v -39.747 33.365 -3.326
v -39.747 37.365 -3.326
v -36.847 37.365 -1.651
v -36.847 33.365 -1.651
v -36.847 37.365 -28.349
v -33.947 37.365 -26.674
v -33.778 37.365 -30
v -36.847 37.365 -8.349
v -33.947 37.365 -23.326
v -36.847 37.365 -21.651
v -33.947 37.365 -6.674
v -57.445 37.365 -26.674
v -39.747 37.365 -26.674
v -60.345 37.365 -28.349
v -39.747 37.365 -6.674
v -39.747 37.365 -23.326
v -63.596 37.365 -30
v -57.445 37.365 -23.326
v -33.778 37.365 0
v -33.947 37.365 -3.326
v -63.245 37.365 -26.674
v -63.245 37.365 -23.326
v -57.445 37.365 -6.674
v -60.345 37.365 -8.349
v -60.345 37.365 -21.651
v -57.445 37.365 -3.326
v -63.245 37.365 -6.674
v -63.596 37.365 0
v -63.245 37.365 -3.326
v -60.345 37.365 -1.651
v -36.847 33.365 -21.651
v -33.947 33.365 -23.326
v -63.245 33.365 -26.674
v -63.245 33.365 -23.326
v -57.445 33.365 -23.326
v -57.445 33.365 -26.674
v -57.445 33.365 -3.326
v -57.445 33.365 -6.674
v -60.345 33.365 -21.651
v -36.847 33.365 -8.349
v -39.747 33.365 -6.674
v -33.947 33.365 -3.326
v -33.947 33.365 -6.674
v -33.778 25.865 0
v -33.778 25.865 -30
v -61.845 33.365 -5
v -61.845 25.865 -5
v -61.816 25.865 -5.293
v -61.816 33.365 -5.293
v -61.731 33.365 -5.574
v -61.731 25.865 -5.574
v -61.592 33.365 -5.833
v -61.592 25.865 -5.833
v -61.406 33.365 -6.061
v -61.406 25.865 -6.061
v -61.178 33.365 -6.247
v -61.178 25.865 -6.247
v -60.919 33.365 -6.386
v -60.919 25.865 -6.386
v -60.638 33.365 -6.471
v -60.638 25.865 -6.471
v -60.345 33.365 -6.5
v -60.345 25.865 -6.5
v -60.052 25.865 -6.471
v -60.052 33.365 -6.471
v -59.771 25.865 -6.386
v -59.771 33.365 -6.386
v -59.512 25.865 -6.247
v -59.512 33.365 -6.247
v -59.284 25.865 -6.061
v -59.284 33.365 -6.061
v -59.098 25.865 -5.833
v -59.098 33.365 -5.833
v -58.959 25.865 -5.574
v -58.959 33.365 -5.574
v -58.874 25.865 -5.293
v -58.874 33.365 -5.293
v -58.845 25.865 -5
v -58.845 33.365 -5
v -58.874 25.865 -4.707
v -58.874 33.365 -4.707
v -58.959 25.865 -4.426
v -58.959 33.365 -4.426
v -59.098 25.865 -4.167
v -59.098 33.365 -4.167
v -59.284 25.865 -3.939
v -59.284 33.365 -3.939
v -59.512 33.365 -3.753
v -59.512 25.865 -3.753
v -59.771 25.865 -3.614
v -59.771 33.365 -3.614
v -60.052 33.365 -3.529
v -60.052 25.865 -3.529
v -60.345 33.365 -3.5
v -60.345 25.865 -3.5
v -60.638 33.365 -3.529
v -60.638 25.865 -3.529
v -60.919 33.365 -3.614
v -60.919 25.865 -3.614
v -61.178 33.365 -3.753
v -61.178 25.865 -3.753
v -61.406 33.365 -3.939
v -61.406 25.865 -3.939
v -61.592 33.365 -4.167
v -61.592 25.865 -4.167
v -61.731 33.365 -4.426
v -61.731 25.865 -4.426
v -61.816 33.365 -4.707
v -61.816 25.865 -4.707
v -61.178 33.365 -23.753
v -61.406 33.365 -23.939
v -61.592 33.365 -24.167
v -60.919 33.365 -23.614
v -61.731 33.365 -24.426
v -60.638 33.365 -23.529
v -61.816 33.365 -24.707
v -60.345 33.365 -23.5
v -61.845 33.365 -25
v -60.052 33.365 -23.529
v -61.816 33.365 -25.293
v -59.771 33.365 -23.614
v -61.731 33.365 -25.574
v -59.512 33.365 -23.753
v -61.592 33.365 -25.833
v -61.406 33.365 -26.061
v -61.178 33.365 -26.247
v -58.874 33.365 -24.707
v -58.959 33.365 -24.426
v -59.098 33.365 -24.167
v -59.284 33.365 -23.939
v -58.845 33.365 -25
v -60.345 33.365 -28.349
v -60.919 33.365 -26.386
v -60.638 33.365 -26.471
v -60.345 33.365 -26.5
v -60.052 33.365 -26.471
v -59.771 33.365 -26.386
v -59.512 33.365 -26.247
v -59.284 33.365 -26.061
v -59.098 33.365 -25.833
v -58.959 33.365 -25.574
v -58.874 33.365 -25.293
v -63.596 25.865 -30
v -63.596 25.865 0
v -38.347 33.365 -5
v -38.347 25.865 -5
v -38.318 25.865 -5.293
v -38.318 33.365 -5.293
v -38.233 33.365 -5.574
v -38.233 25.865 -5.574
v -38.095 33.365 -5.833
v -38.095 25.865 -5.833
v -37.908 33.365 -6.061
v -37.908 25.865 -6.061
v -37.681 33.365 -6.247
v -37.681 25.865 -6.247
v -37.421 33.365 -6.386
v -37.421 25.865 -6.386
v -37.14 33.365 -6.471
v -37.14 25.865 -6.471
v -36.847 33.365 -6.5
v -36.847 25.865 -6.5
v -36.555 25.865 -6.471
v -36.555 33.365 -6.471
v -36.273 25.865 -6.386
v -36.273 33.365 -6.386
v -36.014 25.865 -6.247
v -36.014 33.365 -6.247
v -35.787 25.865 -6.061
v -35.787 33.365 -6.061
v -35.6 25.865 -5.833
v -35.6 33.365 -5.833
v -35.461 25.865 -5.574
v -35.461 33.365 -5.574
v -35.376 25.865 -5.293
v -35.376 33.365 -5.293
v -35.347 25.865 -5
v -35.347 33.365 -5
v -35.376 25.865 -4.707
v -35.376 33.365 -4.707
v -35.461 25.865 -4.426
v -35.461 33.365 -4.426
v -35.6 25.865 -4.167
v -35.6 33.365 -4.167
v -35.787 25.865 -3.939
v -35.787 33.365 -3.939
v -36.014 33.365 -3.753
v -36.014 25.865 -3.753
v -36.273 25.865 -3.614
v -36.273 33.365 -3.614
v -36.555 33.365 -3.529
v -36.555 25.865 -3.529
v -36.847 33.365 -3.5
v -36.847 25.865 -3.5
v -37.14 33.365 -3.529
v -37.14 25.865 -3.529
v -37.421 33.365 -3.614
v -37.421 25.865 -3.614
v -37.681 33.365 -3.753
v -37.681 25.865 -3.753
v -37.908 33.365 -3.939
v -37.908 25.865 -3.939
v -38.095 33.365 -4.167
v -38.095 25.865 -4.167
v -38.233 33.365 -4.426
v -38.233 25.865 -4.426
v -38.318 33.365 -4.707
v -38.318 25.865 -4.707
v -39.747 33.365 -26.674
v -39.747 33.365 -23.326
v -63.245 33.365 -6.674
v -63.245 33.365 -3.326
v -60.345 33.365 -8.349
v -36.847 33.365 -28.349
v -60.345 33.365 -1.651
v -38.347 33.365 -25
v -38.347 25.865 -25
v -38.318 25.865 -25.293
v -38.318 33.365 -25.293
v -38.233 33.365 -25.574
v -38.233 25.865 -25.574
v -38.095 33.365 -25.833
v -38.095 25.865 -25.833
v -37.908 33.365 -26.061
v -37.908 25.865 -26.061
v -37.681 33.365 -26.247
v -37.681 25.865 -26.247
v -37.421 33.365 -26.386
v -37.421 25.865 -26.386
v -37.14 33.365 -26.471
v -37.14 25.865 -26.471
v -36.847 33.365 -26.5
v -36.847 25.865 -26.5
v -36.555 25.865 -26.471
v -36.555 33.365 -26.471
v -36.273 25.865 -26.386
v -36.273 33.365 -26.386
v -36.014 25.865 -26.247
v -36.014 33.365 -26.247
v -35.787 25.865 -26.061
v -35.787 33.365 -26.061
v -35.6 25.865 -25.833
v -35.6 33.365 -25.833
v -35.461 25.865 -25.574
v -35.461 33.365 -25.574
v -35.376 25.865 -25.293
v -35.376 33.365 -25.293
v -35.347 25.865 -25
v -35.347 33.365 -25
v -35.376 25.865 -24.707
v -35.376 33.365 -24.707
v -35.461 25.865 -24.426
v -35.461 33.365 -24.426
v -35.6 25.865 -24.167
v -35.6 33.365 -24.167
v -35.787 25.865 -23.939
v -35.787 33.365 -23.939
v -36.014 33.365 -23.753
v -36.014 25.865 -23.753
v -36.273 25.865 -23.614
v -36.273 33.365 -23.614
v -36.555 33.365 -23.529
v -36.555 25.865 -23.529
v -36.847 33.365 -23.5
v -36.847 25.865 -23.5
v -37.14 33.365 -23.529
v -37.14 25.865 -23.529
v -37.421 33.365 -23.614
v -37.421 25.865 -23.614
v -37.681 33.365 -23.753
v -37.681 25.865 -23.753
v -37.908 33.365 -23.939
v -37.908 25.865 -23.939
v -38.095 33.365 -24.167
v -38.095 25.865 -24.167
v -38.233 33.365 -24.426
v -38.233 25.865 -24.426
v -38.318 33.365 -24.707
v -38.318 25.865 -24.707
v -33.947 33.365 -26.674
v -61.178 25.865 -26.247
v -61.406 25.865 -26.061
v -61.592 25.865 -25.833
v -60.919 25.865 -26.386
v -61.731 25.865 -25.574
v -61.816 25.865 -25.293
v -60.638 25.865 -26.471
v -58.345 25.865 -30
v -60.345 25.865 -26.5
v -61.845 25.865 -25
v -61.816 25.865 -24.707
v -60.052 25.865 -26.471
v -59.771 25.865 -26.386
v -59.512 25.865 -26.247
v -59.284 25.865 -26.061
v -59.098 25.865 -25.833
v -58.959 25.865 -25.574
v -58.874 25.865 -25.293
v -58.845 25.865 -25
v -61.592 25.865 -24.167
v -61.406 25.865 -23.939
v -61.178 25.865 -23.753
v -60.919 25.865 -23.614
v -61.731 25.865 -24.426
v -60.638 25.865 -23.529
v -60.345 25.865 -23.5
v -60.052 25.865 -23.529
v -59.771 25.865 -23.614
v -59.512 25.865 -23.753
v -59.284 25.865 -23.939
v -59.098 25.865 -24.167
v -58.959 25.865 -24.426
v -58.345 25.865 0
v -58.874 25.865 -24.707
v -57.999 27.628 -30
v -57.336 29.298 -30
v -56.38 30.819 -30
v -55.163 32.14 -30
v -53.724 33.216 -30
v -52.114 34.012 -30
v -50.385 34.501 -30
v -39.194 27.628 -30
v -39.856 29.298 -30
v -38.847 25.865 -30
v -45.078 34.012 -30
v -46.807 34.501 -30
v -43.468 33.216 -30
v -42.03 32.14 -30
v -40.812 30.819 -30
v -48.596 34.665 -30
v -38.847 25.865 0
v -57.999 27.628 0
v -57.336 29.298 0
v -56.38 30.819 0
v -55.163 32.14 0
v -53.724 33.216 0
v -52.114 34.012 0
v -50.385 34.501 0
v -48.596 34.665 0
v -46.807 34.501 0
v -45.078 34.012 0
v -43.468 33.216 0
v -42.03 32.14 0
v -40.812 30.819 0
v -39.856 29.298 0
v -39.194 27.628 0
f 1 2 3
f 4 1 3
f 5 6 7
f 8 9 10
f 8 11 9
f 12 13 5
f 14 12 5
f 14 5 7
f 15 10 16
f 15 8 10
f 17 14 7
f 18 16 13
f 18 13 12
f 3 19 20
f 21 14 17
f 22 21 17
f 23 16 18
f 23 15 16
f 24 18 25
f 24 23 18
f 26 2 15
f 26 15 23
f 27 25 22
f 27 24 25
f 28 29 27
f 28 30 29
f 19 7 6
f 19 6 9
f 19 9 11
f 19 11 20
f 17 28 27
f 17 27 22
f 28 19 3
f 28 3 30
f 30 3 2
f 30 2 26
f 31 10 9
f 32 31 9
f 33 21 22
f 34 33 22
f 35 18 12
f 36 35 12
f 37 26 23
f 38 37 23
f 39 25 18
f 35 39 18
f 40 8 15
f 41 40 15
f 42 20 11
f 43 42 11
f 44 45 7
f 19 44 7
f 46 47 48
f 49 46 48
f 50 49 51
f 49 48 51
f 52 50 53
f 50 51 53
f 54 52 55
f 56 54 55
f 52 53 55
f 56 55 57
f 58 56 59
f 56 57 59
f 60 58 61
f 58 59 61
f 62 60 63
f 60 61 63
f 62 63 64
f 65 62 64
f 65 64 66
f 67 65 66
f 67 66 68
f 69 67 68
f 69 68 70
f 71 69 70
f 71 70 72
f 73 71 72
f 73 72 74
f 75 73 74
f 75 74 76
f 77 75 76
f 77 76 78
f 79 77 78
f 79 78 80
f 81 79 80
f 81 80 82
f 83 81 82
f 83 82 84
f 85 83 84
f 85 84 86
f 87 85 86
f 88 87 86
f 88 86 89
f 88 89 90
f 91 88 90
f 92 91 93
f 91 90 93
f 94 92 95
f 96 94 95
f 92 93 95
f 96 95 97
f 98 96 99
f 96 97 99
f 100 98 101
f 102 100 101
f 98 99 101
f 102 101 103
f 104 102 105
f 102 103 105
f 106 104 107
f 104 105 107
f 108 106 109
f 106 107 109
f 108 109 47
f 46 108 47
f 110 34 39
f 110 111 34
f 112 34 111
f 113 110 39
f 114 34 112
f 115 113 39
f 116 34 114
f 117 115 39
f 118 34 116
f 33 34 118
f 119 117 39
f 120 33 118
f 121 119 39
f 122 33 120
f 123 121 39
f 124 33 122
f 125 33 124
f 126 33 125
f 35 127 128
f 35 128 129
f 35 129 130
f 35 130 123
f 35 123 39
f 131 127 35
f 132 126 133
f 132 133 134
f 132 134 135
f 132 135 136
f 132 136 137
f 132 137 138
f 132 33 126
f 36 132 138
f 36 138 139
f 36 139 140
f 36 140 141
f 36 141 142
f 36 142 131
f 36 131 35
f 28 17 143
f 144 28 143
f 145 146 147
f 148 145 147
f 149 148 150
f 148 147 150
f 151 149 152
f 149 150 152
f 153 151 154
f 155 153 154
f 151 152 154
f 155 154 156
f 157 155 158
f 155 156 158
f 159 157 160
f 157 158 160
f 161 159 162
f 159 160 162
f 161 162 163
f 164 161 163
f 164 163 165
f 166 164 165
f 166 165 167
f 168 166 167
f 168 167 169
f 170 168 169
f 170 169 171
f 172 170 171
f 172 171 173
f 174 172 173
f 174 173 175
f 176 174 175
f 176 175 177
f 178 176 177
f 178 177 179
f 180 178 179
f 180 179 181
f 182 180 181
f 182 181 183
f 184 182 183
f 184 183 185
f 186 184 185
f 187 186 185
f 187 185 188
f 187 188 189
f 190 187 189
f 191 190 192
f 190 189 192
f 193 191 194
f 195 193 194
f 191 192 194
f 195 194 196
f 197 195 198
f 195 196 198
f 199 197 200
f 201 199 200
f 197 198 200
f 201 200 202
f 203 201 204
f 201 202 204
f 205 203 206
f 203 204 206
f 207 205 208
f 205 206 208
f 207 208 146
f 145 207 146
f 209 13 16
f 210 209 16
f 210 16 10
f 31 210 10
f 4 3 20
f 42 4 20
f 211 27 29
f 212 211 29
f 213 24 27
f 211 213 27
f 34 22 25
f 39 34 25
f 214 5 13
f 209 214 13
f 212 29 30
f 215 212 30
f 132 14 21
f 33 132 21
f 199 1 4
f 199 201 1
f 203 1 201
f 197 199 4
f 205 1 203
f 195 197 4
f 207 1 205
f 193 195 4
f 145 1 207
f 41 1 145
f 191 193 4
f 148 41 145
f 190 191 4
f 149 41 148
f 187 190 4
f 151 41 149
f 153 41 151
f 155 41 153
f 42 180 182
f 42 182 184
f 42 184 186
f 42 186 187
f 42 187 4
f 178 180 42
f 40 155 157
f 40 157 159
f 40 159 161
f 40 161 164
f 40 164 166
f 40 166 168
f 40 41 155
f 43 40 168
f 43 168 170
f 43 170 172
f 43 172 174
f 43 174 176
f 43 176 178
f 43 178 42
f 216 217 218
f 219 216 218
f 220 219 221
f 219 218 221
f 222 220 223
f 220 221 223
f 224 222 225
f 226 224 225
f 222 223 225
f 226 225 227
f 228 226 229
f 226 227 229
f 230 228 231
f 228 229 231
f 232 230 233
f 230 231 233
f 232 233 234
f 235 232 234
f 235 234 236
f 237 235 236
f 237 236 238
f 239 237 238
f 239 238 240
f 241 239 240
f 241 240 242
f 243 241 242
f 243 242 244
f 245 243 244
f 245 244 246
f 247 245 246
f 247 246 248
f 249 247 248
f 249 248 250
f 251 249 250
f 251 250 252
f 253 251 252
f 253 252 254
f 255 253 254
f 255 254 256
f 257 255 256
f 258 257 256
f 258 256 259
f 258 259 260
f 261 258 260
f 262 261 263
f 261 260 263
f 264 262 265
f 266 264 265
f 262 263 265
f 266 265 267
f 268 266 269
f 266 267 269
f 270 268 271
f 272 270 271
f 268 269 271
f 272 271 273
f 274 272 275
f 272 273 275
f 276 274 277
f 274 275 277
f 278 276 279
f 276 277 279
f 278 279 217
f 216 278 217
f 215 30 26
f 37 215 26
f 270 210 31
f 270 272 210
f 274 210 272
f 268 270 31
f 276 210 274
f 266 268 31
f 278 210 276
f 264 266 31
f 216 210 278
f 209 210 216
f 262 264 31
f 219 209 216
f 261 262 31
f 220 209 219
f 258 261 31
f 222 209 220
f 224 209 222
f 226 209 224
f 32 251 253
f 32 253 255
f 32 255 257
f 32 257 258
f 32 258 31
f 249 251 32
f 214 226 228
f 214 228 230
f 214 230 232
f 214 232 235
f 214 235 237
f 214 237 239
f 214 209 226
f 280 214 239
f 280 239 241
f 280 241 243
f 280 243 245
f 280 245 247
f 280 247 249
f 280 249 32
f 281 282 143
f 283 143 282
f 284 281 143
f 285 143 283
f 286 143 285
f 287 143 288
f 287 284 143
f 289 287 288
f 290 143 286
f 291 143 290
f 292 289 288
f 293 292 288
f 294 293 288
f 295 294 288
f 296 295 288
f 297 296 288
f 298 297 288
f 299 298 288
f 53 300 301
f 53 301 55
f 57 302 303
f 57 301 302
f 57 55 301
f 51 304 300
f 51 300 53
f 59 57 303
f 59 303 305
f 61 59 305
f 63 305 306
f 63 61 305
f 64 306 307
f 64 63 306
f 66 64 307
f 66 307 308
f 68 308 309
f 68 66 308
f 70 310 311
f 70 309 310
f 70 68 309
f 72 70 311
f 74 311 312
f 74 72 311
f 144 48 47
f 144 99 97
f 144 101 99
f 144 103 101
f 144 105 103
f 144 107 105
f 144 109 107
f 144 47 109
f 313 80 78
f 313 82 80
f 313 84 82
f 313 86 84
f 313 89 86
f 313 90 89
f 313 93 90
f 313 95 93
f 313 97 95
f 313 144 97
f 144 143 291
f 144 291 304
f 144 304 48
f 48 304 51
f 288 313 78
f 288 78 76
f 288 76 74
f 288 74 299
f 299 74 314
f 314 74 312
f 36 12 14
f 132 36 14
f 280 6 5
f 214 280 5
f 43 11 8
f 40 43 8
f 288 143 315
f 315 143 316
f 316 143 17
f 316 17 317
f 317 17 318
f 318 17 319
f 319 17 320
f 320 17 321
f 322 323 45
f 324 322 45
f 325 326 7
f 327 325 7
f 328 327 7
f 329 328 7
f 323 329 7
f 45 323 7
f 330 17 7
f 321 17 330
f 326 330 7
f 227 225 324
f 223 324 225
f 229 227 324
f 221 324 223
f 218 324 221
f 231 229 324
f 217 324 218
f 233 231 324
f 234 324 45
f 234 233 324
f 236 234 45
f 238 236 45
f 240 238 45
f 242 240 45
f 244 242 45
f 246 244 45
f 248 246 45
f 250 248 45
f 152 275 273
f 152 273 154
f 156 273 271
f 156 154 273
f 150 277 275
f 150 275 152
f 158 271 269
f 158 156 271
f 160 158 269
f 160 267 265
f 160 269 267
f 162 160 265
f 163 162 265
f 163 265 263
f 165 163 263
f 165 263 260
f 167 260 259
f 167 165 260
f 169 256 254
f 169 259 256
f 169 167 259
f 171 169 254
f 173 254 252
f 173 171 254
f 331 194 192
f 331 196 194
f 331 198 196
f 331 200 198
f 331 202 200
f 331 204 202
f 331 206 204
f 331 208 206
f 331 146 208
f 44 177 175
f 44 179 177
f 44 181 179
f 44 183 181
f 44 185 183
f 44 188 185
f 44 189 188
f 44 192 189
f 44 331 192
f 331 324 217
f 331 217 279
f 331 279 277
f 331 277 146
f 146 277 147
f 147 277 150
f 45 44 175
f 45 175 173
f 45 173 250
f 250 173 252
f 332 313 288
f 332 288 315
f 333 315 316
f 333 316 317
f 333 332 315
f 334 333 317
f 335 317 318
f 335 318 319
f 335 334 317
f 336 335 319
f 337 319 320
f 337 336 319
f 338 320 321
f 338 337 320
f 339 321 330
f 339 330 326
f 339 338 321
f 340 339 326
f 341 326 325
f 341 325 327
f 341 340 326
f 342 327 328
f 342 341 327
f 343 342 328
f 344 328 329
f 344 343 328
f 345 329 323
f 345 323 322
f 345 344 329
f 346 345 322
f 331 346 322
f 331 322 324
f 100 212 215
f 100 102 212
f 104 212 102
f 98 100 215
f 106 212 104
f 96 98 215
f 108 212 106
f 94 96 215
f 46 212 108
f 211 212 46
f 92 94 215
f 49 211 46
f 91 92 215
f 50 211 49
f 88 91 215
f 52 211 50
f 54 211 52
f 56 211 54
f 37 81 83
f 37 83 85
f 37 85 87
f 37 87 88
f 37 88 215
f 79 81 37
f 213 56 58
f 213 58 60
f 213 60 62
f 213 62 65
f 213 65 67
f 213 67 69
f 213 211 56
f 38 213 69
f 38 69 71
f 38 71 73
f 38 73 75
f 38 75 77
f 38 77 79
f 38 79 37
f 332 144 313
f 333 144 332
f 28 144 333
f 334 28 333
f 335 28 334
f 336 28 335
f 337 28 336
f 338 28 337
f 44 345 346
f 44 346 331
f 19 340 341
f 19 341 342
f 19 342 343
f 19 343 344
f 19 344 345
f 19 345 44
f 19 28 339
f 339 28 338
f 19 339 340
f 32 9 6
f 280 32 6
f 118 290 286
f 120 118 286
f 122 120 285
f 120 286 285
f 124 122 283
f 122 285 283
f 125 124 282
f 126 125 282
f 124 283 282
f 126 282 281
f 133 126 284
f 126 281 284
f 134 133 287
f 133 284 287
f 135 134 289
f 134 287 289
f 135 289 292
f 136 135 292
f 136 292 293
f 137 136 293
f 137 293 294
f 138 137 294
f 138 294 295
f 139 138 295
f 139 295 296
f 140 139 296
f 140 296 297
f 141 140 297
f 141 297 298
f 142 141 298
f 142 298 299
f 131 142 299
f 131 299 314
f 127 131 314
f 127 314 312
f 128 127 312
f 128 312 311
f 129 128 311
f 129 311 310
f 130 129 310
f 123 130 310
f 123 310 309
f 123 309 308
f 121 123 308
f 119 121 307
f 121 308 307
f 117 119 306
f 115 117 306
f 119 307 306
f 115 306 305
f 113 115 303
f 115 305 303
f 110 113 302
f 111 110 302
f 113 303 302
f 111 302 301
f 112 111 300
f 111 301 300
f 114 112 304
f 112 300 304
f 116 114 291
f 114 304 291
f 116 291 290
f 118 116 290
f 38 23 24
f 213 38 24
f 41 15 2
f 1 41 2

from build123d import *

# Parameters (mm, degrees)
AUFSATZ_LINEAR_AUSTRAGEN1_DEPTH = 30
F_3_0_3_DURCHMESSER_BOHRUNG1_D  = 3
SCHNITT_LINEAR_AUSTRAGEN1_DEPTH = 4


with BuildPart() as part:
    # Skizze1 → Aufsatz-Linear austragen1 (new body)
    with BuildSketch(Plane.XY):
        with BuildLine():
            Line((-63.596153483, 25.865230167), (-58.344999569, 25.865230167))
            ThreePointArc((-58.344999569, 25.865230167), (-48.596153483, 34.665230167), (-38.847307398, 25.865230167))
            Line((-38.847307398, 25.865230167), (-34.847307398, 25.865230167))
            Line((-34.847307398, 25.865230167), (-34.176711032, 25.865230167))
            Line((-34.176711032, 25.865230167), (-33.778455993, 25.865230167))
            Line((-33.778455993, 25.865230167), (-33.778455993, 37.365230166))
            Line((-33.778455993, 37.365230166), (-34.847307398, 37.365230166))
            Line((-34.847307398, 37.365230166), (-48.596153483, 37.365230166))
            Line((-48.596153483, 37.365230166), (-63.596153483, 37.365230166))
            Line((-63.596153483, 37.365230166), (-63.596153483, 25.865230167))
        make_face()
    extrude(amount=-AUFSATZ_LINEAR_AUSTRAGEN1_DEPTH)

    # Ø3.0 (3) Durchmesser Bohrung1 (through all)
    with Locations(Plane(origin=(0, 37.365230166, 0), x_dir=(1, 0, 0), z_dir=(0, 1, 0))):
        with Locations((-36.847307398, 5), (-60.344999569, 5), (-60.344999569, 25), (-36.847307398, 25)):
            Hole(F_3_0_3_DURCHMESSER_BOHRUNG1_D / 2)

    # Skizze4 → Schnitt-Linear austragen1 (cut)
    with BuildSketch(Plane(origin=(0, 37.365230166, 0), x_dir=(1, 0, 0), z_dir=(0, 1, 0))):
        Polygon((-39.747307398, 26.674315781), (-39.747307398, 23.325684219), (-36.847307398, 21.651368439), (-33.947307398, 23.325684219), (-33.947307398, 26.674315781), (-36.847307398, 28.348631561), align=None)
        Polygon((-60.344999569, 28.348631561), (-63.244999569, 26.674315781), (-63.244999569, 23.325684219), (-60.344999569, 21.651368439), (-57.444999569, 23.325684219), (-57.444999569, 26.674315781), align=None)
        Polygon((-63.244999569, 6.674315781), (-63.244999569, 3.325684219), (-60.344999569, 1.651368439), (-57.444999569, 3.325684219), (-57.444999569, 6.674315781), (-60.344999569, 8.348631561), align=None)
        Polygon((-36.847307398, 8.348631561), (-39.747307398, 6.674315781), (-39.747307398, 3.325684219), (-36.847307398, 1.651368439), (-33.947307398, 3.325684219), (-33.947307398, 6.674315781), align=None)
    extrude(amount=-SCHNITT_LINEAR_AUSTRAGEN1_DEPTH, mode=Mode.SUBTRACT)


solid = part.part
